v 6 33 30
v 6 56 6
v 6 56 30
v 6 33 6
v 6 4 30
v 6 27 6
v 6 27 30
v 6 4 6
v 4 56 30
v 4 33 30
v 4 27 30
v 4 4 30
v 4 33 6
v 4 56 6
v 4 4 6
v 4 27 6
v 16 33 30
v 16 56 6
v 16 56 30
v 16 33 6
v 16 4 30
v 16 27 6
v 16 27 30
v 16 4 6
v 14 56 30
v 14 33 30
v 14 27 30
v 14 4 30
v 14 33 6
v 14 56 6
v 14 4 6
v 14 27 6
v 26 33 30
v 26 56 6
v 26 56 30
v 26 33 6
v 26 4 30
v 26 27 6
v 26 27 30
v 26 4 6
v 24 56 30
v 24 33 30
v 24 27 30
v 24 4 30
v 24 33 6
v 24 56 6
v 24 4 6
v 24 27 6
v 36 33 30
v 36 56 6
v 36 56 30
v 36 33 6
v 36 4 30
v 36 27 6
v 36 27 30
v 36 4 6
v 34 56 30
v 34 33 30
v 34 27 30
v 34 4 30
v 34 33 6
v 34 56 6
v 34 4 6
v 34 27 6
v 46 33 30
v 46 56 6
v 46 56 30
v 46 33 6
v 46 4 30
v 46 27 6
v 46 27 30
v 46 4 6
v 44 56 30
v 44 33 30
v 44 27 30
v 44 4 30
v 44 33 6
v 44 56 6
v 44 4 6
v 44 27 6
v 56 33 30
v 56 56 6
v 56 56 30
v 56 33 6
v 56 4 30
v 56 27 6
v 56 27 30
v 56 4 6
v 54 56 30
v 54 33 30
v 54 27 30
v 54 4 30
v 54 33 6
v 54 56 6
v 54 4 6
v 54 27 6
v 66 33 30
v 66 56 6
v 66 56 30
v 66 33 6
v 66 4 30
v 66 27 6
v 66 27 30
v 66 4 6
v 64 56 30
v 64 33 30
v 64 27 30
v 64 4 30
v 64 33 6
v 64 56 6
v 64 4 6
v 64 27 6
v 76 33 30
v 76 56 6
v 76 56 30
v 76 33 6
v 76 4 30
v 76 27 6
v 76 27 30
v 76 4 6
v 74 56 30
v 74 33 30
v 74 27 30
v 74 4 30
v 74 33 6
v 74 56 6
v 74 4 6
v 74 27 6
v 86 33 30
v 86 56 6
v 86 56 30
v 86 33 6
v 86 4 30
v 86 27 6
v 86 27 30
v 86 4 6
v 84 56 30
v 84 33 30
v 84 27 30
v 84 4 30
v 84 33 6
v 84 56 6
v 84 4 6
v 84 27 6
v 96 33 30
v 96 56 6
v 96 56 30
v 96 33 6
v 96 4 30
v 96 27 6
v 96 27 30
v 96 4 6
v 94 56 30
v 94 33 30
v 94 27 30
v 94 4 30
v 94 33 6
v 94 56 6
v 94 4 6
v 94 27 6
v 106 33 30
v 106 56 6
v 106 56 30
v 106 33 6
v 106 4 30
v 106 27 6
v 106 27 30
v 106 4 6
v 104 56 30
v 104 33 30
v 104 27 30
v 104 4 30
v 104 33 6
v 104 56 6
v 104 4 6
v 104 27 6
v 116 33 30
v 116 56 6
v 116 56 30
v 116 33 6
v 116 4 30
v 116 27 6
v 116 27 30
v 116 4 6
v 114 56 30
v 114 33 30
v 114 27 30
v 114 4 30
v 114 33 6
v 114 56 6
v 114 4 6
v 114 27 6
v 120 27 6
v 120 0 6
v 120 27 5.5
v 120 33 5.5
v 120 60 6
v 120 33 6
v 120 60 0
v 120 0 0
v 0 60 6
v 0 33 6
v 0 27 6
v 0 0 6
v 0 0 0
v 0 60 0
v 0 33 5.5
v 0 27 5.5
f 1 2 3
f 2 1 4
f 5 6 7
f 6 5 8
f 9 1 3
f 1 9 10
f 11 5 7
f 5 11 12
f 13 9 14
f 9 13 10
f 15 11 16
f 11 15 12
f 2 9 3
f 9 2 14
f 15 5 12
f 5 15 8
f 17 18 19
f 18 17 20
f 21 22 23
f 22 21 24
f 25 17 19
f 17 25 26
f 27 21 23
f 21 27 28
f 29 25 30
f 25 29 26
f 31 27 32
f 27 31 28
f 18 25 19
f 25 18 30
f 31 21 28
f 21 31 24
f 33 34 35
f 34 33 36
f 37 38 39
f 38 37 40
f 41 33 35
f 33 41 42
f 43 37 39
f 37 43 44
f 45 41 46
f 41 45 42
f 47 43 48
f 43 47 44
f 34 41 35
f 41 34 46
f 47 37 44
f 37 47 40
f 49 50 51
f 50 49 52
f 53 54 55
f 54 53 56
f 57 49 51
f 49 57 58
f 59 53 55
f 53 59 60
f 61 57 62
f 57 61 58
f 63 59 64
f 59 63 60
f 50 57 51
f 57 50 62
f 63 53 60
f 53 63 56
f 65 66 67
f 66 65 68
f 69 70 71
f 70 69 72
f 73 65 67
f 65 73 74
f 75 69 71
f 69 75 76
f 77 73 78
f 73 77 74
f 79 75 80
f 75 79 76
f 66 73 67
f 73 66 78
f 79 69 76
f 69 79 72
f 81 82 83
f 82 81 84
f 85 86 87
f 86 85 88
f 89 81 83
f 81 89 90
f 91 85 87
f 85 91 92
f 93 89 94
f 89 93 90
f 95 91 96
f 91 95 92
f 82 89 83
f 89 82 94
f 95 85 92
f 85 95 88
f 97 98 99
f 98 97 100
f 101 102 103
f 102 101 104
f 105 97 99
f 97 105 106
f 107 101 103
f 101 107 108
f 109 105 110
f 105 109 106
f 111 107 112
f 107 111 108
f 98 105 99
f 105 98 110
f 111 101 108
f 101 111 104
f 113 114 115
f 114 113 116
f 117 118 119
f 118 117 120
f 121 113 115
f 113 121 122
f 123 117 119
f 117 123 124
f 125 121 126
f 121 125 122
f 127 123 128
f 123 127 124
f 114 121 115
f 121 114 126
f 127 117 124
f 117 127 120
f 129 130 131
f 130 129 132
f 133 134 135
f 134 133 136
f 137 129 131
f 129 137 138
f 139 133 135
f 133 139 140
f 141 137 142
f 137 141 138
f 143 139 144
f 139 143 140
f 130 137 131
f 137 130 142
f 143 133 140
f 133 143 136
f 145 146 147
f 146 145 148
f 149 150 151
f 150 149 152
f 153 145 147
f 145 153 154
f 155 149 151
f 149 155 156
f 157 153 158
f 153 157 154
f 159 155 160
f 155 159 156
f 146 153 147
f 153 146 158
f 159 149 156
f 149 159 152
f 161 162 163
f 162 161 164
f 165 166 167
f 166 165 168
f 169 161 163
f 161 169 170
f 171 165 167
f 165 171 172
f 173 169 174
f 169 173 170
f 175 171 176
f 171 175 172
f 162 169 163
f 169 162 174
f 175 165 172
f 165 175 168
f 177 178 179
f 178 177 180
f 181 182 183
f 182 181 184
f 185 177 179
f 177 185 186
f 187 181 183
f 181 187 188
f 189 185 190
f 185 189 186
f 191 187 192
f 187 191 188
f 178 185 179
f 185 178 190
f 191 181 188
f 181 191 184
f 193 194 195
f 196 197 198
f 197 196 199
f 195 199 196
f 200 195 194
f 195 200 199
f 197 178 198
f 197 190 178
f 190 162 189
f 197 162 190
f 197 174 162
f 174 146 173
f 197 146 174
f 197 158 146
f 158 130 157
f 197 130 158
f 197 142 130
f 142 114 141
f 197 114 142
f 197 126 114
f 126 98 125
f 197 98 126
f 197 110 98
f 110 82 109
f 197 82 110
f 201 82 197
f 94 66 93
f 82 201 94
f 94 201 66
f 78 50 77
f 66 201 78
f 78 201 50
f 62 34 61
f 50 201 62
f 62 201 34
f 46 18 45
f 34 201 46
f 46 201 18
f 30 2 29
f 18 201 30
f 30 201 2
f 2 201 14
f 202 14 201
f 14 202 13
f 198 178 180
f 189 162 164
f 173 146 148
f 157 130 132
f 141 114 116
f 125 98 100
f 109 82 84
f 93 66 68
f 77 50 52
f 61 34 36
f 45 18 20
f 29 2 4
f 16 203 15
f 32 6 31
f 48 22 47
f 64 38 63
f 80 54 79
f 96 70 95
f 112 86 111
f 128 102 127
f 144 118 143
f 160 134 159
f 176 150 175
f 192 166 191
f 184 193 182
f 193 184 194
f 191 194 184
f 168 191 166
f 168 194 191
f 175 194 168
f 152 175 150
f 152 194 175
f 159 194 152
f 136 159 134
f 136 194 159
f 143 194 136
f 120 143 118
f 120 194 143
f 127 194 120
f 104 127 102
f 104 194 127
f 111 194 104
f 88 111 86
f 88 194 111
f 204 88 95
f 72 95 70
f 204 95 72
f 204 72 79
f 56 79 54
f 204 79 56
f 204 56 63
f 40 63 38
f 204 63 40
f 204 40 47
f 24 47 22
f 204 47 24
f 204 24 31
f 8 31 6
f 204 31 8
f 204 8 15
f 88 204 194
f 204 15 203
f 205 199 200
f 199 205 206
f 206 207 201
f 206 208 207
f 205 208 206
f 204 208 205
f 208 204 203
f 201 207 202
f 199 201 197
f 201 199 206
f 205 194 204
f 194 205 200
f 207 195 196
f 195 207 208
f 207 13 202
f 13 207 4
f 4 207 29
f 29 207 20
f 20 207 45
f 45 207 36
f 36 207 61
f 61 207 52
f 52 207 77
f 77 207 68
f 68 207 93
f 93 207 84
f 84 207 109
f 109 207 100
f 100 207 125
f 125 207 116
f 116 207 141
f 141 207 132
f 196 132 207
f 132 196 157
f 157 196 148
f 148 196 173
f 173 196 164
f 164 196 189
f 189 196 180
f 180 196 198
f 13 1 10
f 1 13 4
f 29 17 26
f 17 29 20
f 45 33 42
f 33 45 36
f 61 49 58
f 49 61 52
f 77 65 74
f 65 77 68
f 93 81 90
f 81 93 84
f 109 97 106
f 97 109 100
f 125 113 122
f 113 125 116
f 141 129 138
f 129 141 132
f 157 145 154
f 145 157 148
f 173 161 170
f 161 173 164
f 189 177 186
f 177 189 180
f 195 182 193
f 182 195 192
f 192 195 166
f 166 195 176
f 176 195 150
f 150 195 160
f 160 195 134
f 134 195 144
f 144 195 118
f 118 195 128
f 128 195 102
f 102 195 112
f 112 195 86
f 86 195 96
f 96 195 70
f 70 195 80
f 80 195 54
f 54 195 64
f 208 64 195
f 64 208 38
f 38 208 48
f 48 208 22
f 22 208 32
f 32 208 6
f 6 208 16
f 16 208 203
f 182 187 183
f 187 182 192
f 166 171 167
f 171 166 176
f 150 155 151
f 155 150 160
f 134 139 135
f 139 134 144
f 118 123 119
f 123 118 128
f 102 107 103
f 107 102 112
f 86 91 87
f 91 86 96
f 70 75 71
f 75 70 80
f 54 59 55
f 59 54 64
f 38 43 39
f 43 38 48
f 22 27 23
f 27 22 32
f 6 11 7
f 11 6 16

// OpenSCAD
$fn = 32;

// ----------------------------------------------------------------------
// Heatsink: slotted fin block
// ----------------------------------------------------------------------

// --- parameters (mm) ---
base_l = 120;             // base length, X
base_w = 60;              // base width, Y
base_t = 6;               // base plate thickness
fin_h = 25;               // fin height above the base
fin_t = 2;                // fin thickness
edge = 4;                 // margin from the base ends
pitch = 10;               // fin pitch
slot_w = 6;               // central slot width, Y

n_fins = floor((base_l - 2 * edge - fin_t) / pitch) + 1;  // fin count
total_h = base_t + fin_h - 1;  // overall height

difference() {
union() {
  cube([base_l, base_w, base_t]);
  for (i = [0 : n_fins - 1])
    translate([edge + i * pitch, edge, base_t - 1])
      cube([fin_t, base_w - 2 * edge, fin_h]);
}
  translate([-1, base_w / 2 - slot_w / 2, base_t - 0.5])
    cube([base_l + 2, slot_w, fin_h + 2]);
}
